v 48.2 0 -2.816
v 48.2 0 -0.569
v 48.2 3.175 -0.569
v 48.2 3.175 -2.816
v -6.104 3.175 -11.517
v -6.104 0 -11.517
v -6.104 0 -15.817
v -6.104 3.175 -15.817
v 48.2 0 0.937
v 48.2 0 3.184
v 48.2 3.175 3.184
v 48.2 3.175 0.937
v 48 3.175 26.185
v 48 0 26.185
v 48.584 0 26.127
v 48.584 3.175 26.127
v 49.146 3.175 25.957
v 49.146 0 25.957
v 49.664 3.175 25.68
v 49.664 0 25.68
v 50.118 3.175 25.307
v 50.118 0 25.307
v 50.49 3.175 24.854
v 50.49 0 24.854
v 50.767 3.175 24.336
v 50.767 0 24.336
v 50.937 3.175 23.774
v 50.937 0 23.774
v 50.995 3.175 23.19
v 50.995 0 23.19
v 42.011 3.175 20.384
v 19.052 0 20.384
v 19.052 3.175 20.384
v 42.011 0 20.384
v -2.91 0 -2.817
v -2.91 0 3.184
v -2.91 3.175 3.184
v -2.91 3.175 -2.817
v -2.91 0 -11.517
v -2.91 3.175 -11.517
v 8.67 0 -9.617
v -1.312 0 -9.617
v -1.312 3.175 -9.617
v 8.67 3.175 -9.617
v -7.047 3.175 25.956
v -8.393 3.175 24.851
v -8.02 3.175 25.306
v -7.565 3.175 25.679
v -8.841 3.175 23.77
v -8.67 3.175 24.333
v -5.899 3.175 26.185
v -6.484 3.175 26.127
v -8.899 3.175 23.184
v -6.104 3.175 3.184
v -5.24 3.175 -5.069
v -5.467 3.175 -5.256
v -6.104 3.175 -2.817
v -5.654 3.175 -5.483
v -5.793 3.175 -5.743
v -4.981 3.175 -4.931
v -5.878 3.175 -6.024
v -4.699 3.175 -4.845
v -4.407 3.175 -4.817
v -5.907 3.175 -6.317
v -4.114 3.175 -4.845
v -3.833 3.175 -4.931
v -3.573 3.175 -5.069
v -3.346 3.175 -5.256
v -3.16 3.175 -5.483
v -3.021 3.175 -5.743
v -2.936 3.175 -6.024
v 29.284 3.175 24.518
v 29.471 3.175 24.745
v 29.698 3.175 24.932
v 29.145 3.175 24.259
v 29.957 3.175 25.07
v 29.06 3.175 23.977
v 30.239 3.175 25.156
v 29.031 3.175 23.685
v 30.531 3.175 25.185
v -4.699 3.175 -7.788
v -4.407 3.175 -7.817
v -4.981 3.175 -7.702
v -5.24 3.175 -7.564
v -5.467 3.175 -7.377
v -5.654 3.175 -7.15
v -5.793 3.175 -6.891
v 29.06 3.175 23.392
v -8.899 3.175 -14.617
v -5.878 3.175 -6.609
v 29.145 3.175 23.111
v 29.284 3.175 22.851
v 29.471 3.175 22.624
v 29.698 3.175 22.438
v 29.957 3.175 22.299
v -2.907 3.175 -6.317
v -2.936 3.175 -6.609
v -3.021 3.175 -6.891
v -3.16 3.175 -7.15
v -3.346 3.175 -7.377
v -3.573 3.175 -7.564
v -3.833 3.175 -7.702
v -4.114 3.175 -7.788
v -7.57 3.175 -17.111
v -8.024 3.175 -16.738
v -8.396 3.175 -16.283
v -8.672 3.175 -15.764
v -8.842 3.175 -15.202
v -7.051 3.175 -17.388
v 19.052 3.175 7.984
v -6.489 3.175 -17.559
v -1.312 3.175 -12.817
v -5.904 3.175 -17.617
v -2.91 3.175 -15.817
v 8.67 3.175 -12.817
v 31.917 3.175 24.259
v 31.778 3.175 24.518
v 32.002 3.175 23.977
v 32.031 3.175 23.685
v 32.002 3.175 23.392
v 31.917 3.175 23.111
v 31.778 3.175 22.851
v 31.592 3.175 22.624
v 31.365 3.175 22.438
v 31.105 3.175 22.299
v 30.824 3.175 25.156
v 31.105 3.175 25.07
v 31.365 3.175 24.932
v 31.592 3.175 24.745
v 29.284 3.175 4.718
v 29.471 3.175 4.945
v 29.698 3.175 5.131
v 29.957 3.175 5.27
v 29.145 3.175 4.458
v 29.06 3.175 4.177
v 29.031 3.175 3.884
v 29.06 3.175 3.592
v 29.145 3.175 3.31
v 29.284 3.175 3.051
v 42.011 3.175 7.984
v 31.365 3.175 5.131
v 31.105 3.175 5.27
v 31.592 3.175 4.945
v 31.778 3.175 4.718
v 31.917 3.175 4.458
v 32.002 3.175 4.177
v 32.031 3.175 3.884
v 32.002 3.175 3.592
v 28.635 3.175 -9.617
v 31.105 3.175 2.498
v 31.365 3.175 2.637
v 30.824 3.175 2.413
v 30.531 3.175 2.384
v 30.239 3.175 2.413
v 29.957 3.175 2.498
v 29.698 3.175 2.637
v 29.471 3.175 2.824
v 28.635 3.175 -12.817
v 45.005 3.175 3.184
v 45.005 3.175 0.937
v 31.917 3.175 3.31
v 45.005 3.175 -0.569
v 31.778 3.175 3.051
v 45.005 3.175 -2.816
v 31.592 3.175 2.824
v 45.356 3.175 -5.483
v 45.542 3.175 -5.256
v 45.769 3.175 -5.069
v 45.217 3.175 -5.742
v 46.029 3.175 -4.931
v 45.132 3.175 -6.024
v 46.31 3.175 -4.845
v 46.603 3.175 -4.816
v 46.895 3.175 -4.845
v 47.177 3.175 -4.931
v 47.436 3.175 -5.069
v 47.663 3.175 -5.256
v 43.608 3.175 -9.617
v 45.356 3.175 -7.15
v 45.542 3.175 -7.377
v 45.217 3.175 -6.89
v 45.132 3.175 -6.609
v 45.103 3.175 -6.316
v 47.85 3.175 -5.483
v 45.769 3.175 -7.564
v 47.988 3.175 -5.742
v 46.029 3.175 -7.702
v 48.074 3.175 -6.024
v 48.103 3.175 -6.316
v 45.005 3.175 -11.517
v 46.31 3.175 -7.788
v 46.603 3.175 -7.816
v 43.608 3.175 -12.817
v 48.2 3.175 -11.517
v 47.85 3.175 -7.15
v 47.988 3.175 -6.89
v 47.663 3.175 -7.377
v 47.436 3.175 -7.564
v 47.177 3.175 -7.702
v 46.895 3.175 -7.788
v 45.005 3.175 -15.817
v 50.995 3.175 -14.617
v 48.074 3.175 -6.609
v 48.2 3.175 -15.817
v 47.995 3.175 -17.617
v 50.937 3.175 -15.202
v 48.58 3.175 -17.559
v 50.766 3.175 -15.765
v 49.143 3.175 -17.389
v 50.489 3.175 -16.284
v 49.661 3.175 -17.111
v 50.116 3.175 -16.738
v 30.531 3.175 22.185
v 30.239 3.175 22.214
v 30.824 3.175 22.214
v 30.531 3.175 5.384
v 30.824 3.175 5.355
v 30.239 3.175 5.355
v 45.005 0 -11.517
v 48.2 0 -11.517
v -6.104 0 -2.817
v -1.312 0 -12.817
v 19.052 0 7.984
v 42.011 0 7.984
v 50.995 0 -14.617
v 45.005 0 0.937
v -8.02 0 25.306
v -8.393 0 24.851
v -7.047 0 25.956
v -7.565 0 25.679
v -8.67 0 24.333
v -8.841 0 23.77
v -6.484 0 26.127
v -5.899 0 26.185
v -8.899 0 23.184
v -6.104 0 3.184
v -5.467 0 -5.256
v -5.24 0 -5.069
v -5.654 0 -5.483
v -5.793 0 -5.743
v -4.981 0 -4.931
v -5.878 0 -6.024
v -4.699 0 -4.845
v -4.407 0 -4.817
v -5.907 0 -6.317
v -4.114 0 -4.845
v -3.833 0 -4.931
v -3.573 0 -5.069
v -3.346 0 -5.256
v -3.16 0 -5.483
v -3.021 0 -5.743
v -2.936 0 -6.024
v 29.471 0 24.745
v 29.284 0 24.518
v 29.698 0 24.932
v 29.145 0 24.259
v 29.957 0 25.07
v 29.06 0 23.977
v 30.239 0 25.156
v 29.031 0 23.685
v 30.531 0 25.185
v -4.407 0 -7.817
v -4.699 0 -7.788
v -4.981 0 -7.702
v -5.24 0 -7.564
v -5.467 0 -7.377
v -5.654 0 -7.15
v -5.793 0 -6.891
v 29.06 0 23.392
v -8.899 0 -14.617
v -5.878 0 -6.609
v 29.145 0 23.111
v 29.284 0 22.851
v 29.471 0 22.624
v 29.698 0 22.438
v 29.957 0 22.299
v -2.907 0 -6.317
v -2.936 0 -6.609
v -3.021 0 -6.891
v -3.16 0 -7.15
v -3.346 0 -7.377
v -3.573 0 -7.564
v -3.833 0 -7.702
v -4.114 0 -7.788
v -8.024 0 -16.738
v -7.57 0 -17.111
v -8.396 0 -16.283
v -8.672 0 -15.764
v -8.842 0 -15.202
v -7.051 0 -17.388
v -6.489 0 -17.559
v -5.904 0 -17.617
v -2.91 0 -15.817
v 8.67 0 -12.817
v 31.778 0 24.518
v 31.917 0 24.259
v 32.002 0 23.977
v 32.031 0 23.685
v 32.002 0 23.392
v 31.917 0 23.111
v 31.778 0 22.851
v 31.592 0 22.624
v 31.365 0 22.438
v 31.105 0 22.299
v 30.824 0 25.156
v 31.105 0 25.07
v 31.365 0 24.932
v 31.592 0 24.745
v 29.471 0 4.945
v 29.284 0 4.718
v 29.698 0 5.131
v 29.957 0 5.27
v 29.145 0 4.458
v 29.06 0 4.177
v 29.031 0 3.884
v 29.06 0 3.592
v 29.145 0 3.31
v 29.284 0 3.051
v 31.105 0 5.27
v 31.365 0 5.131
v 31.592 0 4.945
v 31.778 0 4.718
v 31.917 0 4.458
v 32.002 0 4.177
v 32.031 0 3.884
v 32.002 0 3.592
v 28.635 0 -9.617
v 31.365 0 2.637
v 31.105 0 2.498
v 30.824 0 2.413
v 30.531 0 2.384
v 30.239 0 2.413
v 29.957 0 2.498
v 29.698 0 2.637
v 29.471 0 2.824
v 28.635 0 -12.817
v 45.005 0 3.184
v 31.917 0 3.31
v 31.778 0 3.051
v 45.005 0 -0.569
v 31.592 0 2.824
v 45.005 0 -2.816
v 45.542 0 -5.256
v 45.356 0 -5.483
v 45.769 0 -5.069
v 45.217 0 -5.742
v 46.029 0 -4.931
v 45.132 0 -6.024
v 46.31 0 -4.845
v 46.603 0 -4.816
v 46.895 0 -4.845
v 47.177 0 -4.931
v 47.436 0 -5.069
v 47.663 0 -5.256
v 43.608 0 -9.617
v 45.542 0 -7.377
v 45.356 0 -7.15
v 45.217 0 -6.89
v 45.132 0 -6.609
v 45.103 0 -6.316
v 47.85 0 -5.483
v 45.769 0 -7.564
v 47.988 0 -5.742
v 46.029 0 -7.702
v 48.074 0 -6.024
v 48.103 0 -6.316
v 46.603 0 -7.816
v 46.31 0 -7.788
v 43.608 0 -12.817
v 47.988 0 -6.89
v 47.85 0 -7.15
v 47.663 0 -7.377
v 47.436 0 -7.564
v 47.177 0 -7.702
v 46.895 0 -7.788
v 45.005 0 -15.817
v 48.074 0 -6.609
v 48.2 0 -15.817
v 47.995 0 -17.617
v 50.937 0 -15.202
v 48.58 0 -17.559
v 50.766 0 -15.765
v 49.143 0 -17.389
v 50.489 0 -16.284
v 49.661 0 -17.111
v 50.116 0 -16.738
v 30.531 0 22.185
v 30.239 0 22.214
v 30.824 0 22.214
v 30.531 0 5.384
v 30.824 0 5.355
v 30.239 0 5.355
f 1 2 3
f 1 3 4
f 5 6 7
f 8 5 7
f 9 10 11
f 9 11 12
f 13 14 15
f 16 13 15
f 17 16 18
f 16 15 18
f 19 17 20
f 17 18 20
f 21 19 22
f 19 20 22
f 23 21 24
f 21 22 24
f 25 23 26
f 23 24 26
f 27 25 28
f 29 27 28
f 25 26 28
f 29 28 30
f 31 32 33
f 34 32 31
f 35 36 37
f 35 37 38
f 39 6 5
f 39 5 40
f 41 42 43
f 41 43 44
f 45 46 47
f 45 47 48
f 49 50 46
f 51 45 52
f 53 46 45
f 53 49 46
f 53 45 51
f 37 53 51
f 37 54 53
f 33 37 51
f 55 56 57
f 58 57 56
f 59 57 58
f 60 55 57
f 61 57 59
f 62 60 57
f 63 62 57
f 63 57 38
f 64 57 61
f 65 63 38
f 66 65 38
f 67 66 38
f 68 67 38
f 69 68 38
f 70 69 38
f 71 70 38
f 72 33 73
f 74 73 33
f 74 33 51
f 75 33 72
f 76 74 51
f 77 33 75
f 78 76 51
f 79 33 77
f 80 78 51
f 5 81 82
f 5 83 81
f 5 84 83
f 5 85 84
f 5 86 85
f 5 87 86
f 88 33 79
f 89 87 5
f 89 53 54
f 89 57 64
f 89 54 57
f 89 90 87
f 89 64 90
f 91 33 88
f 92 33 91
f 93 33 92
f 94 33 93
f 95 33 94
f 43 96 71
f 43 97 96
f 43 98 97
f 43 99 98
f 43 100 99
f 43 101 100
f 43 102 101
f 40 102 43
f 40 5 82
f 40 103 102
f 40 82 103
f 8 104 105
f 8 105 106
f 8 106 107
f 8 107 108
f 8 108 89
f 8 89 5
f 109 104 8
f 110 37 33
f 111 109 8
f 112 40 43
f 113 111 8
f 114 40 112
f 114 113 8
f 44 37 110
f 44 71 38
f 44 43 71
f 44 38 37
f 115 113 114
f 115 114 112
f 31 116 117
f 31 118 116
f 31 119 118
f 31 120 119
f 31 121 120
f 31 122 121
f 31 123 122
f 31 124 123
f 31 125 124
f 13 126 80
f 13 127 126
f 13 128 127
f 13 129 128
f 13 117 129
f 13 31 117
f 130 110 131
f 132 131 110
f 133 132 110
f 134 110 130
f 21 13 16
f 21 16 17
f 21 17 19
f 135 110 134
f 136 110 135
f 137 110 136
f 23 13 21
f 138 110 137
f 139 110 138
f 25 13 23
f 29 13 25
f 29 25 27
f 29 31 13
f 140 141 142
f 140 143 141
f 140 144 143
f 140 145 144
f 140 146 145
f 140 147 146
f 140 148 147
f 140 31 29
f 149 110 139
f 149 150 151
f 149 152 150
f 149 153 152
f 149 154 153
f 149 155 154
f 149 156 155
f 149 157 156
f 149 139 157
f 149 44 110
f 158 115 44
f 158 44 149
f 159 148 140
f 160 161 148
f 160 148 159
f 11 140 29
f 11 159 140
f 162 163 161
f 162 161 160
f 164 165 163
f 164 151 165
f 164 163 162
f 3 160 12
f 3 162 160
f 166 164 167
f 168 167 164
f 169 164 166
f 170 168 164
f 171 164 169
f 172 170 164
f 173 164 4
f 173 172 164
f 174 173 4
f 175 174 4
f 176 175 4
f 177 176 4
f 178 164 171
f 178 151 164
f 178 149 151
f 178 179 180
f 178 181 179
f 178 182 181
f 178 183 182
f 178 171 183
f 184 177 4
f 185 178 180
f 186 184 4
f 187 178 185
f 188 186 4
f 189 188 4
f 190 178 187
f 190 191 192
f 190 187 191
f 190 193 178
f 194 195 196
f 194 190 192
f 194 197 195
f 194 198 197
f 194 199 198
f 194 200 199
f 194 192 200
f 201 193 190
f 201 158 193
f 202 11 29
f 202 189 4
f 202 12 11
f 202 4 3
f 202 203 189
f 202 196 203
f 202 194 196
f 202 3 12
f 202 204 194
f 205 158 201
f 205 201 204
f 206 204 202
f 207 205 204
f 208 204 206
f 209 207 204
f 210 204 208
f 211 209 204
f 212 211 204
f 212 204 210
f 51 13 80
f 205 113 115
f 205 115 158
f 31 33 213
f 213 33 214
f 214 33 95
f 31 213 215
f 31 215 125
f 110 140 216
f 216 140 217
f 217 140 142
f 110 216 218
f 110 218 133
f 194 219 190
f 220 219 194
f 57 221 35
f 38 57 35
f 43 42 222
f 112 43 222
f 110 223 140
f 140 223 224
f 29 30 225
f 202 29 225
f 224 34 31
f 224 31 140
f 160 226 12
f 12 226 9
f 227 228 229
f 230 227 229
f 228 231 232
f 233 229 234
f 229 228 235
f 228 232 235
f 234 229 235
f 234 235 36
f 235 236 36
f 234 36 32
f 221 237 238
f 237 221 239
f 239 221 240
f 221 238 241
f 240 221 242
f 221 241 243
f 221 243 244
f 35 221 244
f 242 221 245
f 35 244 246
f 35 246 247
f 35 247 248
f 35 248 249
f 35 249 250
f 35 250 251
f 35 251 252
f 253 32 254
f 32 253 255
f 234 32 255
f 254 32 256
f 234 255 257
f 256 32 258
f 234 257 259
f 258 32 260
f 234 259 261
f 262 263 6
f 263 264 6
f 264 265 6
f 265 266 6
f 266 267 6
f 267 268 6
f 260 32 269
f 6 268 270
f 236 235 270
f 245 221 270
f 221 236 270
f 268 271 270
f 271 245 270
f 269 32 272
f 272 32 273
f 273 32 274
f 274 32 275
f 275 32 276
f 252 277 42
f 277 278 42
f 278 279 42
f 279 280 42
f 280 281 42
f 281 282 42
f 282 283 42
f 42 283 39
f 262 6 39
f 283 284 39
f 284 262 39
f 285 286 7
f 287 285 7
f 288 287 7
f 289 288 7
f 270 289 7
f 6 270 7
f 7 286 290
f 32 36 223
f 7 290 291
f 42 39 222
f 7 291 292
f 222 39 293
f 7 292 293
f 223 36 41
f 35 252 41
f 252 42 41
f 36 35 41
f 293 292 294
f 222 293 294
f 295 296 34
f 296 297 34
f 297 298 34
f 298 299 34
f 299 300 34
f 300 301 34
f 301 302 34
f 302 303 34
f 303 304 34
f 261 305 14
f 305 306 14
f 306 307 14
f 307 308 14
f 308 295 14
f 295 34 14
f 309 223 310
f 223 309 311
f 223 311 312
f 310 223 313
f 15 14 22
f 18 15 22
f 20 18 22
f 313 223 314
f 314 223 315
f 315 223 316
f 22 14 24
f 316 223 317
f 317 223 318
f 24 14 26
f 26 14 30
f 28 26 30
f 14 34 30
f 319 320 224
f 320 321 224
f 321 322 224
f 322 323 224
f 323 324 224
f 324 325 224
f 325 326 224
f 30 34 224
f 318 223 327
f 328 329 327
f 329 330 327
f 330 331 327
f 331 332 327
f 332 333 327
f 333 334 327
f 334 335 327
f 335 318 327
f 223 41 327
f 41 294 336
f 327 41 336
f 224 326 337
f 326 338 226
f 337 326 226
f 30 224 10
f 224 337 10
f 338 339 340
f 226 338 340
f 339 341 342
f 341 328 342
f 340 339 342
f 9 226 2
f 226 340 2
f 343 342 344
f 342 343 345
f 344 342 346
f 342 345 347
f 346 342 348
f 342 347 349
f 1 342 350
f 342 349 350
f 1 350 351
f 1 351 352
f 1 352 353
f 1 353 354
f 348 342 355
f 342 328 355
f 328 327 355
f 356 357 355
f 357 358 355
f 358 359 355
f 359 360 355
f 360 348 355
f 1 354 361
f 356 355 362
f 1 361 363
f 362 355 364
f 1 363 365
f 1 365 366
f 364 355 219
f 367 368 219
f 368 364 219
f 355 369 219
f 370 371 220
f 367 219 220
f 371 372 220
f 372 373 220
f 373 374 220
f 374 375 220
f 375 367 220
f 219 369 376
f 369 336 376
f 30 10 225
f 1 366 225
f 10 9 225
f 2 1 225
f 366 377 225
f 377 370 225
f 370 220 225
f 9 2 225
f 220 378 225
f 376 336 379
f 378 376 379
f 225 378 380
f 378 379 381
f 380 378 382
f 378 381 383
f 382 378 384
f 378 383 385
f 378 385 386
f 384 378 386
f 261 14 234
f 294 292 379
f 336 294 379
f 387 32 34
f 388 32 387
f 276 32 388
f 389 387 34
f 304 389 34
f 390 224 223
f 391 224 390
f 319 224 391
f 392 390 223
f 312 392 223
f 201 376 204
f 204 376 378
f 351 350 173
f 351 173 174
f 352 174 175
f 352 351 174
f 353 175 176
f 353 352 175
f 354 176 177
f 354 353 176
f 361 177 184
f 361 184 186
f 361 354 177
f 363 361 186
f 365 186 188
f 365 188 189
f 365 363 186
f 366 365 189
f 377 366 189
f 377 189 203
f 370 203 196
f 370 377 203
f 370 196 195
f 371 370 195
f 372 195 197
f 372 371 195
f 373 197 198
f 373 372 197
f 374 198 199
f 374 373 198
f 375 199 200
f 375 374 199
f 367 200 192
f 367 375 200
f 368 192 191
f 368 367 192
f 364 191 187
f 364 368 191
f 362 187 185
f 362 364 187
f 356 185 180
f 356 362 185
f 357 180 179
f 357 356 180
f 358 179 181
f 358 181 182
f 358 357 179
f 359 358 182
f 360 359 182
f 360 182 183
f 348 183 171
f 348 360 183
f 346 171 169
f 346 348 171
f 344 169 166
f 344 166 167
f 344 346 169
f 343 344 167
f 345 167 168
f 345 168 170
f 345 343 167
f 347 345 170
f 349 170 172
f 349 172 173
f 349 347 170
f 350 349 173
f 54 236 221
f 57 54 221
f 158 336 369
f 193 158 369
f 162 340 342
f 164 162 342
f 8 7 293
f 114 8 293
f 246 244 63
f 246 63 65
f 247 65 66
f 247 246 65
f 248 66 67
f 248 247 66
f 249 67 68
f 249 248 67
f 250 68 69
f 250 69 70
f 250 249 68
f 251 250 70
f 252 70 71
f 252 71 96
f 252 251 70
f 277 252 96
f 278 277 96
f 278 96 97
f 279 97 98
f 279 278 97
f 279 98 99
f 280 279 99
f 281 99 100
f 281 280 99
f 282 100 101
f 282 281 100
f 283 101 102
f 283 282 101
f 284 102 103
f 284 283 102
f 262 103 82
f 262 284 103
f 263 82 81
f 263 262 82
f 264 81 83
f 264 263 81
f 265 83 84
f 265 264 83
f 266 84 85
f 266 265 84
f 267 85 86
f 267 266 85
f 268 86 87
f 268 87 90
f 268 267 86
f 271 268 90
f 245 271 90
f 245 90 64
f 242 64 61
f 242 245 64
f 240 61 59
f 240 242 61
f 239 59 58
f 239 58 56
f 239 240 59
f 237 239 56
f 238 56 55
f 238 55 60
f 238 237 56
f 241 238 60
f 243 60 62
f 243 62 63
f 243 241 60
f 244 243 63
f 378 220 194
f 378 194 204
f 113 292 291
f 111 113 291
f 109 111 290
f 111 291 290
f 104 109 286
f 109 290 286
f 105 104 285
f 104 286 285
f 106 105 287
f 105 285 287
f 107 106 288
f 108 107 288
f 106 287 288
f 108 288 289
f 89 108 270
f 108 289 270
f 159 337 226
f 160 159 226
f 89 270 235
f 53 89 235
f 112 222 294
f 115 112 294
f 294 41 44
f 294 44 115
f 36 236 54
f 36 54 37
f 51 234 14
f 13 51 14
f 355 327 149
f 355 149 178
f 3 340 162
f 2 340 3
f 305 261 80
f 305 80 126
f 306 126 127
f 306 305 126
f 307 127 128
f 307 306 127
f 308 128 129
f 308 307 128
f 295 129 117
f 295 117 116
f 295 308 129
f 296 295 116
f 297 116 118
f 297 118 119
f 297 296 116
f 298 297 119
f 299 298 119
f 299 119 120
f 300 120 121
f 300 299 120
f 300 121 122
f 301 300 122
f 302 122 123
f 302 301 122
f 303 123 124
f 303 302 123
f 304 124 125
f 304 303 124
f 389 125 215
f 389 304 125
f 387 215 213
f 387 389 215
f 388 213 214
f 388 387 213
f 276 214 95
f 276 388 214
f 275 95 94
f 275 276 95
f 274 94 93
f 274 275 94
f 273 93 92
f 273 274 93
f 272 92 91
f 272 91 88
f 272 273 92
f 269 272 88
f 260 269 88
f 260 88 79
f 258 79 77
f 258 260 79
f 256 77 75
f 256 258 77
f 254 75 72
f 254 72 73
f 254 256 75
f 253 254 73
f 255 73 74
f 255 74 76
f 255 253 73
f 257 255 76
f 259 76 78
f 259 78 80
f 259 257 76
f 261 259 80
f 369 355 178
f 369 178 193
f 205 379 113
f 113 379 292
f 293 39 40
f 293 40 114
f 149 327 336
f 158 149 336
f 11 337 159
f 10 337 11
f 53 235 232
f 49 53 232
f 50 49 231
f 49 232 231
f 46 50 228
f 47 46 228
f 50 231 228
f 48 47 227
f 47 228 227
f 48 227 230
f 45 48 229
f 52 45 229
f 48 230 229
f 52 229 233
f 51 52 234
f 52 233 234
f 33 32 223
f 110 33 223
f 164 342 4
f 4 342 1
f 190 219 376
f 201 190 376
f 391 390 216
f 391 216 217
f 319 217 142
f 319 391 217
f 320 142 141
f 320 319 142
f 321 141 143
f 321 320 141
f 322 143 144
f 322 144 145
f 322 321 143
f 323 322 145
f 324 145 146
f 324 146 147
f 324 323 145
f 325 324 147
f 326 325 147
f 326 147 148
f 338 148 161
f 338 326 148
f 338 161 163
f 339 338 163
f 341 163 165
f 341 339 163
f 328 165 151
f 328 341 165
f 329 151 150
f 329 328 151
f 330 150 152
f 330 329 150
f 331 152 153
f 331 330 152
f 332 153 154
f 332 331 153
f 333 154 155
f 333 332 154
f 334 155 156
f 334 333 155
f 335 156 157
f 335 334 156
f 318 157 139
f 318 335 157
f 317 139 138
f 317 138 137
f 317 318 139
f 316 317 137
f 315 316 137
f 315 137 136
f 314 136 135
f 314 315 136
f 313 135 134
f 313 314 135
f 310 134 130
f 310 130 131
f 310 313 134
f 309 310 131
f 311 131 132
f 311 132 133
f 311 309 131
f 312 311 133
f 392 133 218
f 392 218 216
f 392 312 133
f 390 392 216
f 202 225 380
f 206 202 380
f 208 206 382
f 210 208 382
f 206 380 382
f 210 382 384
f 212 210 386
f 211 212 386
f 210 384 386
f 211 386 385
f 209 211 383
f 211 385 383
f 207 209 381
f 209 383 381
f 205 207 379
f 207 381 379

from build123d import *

# Parameters (mm, degrees)
SKETCH1_R           = 1.499947483
SKETCH1_W           = 3.194434014
SKETCH1_H           = 2.247005984
SKETCH1_W_2         = 3.194258538
SKETCH1_H_2         = 6.00021965
SKETCH1_W_3         = 14.9734805
SKETCH1_H_3         = 3.200030878
SKETCH1_W_4         = 9.982157856
SKETCH1_W_5         = 3.194239042
SKETCH1_H_4         = 4.3002681
SKETCH1_H_5         = 2.247064582
SKETCH1_H_6         = 4.300268101
SKETCH1_W_6         = 22.959156093
SKETCH1_H_7         = 12.400537771
BOSS_EXTRUDE1_DEPTH = 3.175


with BuildPart() as part:
    # Sketch1 → Boss-Extrude1 (new body)
    with BuildSketch(Plane(origin=(0, 0, 0), x_dir=(1, 0, 0), z_dir=(0, 1, 0))):
        with BuildLine():
            Line((-8.89863563, 14.616816531), (-8.898772113, -23.184447467))
            ThreePointArc((-8.898772113, -23.184447467), (-8.020049515, -25.305871479), (-5.898625504, -26.184594076))
            Line((-5.898625504, -26.184594076), (48.00009504, -26.184594076))
            ThreePointArc((48.00009504, -26.184594076), (50.117687721, -25.307458468), (50.994823329, -23.189865787))
            Line((50.994823329, -23.189865787), (50.994823329, 14.616811748))
            ThreePointArc((50.994823329, 14.616811748), (50.116118686, 16.738192414), (47.99473802, 17.616897057))
            Line((47.99473802, 17.616897057), (-5.904126705, 17.616897057))
            ThreePointArc((-5.904126705, 17.616897057), (-8.023535046, 16.737855239), (-8.89863563, 14.616816531))
        make_face()
        with Locations(Location((-4.406755257, 6.316598951, 0), (0, 0, 270))):
            Circle(SKETCH1_R, mode=Mode.SUBTRACT)
        with Locations(Location((30.531216432, -3.884174874, 0), (0, 0, 270))):
            Circle(SKETCH1_R, mode=Mode.SUBTRACT)
        with Locations(Location((46.602725133, 6.316403622, 0), (0, 0, 270))):
            Circle(SKETCH1_R, mode=Mode.SUBTRACT)
        with Locations(Location((30.531216431, -23.684709277, 0), (0, 0, 270))):
            Circle(SKETCH1_R, mode=Mode.SUBTRACT)
        with Locations((46.602666641, -2.060335363)):
            Rectangle(SKETCH1_W, SKETCH1_H, mode=Mode.SUBTRACT)
        with Locations((-4.506903026, -0.183533202)):
            Rectangle(SKETCH1_W_2, SKETCH1_H_2, mode=Mode.SUBTRACT)
        with Locations((36.121280984, 11.216808443)):
            Rectangle(SKETCH1_W_3, SKETCH1_H_3, mode=Mode.SUBTRACT)
        with Locations((3.678834136, 11.216808444)):
            Rectangle(SKETCH1_W_4, SKETCH1_H_3, mode=Mode.SUBTRACT)
        with Locations((-4.506717801, 13.66683384)):
            Rectangle(SKETCH1_W_5, SKETCH1_H_4, mode=Mode.SUBTRACT)
        with Locations((46.602666641, 1.692917368)):
            Rectangle(SKETCH1_W, SKETCH1_H_5, mode=Mode.SUBTRACT)
        with Locations((46.602666642, 13.666833838)):
            Rectangle(SKETCH1_W, SKETCH1_H_6, mode=Mode.SUBTRACT)
        with Locations((30.531148191, -14.184180414)):
            Rectangle(SKETCH1_W_6, SKETCH1_H_7, mode=Mode.SUBTRACT)
    extrude(amount=BOSS_EXTRUDE1_DEPTH)


solid = part.part
